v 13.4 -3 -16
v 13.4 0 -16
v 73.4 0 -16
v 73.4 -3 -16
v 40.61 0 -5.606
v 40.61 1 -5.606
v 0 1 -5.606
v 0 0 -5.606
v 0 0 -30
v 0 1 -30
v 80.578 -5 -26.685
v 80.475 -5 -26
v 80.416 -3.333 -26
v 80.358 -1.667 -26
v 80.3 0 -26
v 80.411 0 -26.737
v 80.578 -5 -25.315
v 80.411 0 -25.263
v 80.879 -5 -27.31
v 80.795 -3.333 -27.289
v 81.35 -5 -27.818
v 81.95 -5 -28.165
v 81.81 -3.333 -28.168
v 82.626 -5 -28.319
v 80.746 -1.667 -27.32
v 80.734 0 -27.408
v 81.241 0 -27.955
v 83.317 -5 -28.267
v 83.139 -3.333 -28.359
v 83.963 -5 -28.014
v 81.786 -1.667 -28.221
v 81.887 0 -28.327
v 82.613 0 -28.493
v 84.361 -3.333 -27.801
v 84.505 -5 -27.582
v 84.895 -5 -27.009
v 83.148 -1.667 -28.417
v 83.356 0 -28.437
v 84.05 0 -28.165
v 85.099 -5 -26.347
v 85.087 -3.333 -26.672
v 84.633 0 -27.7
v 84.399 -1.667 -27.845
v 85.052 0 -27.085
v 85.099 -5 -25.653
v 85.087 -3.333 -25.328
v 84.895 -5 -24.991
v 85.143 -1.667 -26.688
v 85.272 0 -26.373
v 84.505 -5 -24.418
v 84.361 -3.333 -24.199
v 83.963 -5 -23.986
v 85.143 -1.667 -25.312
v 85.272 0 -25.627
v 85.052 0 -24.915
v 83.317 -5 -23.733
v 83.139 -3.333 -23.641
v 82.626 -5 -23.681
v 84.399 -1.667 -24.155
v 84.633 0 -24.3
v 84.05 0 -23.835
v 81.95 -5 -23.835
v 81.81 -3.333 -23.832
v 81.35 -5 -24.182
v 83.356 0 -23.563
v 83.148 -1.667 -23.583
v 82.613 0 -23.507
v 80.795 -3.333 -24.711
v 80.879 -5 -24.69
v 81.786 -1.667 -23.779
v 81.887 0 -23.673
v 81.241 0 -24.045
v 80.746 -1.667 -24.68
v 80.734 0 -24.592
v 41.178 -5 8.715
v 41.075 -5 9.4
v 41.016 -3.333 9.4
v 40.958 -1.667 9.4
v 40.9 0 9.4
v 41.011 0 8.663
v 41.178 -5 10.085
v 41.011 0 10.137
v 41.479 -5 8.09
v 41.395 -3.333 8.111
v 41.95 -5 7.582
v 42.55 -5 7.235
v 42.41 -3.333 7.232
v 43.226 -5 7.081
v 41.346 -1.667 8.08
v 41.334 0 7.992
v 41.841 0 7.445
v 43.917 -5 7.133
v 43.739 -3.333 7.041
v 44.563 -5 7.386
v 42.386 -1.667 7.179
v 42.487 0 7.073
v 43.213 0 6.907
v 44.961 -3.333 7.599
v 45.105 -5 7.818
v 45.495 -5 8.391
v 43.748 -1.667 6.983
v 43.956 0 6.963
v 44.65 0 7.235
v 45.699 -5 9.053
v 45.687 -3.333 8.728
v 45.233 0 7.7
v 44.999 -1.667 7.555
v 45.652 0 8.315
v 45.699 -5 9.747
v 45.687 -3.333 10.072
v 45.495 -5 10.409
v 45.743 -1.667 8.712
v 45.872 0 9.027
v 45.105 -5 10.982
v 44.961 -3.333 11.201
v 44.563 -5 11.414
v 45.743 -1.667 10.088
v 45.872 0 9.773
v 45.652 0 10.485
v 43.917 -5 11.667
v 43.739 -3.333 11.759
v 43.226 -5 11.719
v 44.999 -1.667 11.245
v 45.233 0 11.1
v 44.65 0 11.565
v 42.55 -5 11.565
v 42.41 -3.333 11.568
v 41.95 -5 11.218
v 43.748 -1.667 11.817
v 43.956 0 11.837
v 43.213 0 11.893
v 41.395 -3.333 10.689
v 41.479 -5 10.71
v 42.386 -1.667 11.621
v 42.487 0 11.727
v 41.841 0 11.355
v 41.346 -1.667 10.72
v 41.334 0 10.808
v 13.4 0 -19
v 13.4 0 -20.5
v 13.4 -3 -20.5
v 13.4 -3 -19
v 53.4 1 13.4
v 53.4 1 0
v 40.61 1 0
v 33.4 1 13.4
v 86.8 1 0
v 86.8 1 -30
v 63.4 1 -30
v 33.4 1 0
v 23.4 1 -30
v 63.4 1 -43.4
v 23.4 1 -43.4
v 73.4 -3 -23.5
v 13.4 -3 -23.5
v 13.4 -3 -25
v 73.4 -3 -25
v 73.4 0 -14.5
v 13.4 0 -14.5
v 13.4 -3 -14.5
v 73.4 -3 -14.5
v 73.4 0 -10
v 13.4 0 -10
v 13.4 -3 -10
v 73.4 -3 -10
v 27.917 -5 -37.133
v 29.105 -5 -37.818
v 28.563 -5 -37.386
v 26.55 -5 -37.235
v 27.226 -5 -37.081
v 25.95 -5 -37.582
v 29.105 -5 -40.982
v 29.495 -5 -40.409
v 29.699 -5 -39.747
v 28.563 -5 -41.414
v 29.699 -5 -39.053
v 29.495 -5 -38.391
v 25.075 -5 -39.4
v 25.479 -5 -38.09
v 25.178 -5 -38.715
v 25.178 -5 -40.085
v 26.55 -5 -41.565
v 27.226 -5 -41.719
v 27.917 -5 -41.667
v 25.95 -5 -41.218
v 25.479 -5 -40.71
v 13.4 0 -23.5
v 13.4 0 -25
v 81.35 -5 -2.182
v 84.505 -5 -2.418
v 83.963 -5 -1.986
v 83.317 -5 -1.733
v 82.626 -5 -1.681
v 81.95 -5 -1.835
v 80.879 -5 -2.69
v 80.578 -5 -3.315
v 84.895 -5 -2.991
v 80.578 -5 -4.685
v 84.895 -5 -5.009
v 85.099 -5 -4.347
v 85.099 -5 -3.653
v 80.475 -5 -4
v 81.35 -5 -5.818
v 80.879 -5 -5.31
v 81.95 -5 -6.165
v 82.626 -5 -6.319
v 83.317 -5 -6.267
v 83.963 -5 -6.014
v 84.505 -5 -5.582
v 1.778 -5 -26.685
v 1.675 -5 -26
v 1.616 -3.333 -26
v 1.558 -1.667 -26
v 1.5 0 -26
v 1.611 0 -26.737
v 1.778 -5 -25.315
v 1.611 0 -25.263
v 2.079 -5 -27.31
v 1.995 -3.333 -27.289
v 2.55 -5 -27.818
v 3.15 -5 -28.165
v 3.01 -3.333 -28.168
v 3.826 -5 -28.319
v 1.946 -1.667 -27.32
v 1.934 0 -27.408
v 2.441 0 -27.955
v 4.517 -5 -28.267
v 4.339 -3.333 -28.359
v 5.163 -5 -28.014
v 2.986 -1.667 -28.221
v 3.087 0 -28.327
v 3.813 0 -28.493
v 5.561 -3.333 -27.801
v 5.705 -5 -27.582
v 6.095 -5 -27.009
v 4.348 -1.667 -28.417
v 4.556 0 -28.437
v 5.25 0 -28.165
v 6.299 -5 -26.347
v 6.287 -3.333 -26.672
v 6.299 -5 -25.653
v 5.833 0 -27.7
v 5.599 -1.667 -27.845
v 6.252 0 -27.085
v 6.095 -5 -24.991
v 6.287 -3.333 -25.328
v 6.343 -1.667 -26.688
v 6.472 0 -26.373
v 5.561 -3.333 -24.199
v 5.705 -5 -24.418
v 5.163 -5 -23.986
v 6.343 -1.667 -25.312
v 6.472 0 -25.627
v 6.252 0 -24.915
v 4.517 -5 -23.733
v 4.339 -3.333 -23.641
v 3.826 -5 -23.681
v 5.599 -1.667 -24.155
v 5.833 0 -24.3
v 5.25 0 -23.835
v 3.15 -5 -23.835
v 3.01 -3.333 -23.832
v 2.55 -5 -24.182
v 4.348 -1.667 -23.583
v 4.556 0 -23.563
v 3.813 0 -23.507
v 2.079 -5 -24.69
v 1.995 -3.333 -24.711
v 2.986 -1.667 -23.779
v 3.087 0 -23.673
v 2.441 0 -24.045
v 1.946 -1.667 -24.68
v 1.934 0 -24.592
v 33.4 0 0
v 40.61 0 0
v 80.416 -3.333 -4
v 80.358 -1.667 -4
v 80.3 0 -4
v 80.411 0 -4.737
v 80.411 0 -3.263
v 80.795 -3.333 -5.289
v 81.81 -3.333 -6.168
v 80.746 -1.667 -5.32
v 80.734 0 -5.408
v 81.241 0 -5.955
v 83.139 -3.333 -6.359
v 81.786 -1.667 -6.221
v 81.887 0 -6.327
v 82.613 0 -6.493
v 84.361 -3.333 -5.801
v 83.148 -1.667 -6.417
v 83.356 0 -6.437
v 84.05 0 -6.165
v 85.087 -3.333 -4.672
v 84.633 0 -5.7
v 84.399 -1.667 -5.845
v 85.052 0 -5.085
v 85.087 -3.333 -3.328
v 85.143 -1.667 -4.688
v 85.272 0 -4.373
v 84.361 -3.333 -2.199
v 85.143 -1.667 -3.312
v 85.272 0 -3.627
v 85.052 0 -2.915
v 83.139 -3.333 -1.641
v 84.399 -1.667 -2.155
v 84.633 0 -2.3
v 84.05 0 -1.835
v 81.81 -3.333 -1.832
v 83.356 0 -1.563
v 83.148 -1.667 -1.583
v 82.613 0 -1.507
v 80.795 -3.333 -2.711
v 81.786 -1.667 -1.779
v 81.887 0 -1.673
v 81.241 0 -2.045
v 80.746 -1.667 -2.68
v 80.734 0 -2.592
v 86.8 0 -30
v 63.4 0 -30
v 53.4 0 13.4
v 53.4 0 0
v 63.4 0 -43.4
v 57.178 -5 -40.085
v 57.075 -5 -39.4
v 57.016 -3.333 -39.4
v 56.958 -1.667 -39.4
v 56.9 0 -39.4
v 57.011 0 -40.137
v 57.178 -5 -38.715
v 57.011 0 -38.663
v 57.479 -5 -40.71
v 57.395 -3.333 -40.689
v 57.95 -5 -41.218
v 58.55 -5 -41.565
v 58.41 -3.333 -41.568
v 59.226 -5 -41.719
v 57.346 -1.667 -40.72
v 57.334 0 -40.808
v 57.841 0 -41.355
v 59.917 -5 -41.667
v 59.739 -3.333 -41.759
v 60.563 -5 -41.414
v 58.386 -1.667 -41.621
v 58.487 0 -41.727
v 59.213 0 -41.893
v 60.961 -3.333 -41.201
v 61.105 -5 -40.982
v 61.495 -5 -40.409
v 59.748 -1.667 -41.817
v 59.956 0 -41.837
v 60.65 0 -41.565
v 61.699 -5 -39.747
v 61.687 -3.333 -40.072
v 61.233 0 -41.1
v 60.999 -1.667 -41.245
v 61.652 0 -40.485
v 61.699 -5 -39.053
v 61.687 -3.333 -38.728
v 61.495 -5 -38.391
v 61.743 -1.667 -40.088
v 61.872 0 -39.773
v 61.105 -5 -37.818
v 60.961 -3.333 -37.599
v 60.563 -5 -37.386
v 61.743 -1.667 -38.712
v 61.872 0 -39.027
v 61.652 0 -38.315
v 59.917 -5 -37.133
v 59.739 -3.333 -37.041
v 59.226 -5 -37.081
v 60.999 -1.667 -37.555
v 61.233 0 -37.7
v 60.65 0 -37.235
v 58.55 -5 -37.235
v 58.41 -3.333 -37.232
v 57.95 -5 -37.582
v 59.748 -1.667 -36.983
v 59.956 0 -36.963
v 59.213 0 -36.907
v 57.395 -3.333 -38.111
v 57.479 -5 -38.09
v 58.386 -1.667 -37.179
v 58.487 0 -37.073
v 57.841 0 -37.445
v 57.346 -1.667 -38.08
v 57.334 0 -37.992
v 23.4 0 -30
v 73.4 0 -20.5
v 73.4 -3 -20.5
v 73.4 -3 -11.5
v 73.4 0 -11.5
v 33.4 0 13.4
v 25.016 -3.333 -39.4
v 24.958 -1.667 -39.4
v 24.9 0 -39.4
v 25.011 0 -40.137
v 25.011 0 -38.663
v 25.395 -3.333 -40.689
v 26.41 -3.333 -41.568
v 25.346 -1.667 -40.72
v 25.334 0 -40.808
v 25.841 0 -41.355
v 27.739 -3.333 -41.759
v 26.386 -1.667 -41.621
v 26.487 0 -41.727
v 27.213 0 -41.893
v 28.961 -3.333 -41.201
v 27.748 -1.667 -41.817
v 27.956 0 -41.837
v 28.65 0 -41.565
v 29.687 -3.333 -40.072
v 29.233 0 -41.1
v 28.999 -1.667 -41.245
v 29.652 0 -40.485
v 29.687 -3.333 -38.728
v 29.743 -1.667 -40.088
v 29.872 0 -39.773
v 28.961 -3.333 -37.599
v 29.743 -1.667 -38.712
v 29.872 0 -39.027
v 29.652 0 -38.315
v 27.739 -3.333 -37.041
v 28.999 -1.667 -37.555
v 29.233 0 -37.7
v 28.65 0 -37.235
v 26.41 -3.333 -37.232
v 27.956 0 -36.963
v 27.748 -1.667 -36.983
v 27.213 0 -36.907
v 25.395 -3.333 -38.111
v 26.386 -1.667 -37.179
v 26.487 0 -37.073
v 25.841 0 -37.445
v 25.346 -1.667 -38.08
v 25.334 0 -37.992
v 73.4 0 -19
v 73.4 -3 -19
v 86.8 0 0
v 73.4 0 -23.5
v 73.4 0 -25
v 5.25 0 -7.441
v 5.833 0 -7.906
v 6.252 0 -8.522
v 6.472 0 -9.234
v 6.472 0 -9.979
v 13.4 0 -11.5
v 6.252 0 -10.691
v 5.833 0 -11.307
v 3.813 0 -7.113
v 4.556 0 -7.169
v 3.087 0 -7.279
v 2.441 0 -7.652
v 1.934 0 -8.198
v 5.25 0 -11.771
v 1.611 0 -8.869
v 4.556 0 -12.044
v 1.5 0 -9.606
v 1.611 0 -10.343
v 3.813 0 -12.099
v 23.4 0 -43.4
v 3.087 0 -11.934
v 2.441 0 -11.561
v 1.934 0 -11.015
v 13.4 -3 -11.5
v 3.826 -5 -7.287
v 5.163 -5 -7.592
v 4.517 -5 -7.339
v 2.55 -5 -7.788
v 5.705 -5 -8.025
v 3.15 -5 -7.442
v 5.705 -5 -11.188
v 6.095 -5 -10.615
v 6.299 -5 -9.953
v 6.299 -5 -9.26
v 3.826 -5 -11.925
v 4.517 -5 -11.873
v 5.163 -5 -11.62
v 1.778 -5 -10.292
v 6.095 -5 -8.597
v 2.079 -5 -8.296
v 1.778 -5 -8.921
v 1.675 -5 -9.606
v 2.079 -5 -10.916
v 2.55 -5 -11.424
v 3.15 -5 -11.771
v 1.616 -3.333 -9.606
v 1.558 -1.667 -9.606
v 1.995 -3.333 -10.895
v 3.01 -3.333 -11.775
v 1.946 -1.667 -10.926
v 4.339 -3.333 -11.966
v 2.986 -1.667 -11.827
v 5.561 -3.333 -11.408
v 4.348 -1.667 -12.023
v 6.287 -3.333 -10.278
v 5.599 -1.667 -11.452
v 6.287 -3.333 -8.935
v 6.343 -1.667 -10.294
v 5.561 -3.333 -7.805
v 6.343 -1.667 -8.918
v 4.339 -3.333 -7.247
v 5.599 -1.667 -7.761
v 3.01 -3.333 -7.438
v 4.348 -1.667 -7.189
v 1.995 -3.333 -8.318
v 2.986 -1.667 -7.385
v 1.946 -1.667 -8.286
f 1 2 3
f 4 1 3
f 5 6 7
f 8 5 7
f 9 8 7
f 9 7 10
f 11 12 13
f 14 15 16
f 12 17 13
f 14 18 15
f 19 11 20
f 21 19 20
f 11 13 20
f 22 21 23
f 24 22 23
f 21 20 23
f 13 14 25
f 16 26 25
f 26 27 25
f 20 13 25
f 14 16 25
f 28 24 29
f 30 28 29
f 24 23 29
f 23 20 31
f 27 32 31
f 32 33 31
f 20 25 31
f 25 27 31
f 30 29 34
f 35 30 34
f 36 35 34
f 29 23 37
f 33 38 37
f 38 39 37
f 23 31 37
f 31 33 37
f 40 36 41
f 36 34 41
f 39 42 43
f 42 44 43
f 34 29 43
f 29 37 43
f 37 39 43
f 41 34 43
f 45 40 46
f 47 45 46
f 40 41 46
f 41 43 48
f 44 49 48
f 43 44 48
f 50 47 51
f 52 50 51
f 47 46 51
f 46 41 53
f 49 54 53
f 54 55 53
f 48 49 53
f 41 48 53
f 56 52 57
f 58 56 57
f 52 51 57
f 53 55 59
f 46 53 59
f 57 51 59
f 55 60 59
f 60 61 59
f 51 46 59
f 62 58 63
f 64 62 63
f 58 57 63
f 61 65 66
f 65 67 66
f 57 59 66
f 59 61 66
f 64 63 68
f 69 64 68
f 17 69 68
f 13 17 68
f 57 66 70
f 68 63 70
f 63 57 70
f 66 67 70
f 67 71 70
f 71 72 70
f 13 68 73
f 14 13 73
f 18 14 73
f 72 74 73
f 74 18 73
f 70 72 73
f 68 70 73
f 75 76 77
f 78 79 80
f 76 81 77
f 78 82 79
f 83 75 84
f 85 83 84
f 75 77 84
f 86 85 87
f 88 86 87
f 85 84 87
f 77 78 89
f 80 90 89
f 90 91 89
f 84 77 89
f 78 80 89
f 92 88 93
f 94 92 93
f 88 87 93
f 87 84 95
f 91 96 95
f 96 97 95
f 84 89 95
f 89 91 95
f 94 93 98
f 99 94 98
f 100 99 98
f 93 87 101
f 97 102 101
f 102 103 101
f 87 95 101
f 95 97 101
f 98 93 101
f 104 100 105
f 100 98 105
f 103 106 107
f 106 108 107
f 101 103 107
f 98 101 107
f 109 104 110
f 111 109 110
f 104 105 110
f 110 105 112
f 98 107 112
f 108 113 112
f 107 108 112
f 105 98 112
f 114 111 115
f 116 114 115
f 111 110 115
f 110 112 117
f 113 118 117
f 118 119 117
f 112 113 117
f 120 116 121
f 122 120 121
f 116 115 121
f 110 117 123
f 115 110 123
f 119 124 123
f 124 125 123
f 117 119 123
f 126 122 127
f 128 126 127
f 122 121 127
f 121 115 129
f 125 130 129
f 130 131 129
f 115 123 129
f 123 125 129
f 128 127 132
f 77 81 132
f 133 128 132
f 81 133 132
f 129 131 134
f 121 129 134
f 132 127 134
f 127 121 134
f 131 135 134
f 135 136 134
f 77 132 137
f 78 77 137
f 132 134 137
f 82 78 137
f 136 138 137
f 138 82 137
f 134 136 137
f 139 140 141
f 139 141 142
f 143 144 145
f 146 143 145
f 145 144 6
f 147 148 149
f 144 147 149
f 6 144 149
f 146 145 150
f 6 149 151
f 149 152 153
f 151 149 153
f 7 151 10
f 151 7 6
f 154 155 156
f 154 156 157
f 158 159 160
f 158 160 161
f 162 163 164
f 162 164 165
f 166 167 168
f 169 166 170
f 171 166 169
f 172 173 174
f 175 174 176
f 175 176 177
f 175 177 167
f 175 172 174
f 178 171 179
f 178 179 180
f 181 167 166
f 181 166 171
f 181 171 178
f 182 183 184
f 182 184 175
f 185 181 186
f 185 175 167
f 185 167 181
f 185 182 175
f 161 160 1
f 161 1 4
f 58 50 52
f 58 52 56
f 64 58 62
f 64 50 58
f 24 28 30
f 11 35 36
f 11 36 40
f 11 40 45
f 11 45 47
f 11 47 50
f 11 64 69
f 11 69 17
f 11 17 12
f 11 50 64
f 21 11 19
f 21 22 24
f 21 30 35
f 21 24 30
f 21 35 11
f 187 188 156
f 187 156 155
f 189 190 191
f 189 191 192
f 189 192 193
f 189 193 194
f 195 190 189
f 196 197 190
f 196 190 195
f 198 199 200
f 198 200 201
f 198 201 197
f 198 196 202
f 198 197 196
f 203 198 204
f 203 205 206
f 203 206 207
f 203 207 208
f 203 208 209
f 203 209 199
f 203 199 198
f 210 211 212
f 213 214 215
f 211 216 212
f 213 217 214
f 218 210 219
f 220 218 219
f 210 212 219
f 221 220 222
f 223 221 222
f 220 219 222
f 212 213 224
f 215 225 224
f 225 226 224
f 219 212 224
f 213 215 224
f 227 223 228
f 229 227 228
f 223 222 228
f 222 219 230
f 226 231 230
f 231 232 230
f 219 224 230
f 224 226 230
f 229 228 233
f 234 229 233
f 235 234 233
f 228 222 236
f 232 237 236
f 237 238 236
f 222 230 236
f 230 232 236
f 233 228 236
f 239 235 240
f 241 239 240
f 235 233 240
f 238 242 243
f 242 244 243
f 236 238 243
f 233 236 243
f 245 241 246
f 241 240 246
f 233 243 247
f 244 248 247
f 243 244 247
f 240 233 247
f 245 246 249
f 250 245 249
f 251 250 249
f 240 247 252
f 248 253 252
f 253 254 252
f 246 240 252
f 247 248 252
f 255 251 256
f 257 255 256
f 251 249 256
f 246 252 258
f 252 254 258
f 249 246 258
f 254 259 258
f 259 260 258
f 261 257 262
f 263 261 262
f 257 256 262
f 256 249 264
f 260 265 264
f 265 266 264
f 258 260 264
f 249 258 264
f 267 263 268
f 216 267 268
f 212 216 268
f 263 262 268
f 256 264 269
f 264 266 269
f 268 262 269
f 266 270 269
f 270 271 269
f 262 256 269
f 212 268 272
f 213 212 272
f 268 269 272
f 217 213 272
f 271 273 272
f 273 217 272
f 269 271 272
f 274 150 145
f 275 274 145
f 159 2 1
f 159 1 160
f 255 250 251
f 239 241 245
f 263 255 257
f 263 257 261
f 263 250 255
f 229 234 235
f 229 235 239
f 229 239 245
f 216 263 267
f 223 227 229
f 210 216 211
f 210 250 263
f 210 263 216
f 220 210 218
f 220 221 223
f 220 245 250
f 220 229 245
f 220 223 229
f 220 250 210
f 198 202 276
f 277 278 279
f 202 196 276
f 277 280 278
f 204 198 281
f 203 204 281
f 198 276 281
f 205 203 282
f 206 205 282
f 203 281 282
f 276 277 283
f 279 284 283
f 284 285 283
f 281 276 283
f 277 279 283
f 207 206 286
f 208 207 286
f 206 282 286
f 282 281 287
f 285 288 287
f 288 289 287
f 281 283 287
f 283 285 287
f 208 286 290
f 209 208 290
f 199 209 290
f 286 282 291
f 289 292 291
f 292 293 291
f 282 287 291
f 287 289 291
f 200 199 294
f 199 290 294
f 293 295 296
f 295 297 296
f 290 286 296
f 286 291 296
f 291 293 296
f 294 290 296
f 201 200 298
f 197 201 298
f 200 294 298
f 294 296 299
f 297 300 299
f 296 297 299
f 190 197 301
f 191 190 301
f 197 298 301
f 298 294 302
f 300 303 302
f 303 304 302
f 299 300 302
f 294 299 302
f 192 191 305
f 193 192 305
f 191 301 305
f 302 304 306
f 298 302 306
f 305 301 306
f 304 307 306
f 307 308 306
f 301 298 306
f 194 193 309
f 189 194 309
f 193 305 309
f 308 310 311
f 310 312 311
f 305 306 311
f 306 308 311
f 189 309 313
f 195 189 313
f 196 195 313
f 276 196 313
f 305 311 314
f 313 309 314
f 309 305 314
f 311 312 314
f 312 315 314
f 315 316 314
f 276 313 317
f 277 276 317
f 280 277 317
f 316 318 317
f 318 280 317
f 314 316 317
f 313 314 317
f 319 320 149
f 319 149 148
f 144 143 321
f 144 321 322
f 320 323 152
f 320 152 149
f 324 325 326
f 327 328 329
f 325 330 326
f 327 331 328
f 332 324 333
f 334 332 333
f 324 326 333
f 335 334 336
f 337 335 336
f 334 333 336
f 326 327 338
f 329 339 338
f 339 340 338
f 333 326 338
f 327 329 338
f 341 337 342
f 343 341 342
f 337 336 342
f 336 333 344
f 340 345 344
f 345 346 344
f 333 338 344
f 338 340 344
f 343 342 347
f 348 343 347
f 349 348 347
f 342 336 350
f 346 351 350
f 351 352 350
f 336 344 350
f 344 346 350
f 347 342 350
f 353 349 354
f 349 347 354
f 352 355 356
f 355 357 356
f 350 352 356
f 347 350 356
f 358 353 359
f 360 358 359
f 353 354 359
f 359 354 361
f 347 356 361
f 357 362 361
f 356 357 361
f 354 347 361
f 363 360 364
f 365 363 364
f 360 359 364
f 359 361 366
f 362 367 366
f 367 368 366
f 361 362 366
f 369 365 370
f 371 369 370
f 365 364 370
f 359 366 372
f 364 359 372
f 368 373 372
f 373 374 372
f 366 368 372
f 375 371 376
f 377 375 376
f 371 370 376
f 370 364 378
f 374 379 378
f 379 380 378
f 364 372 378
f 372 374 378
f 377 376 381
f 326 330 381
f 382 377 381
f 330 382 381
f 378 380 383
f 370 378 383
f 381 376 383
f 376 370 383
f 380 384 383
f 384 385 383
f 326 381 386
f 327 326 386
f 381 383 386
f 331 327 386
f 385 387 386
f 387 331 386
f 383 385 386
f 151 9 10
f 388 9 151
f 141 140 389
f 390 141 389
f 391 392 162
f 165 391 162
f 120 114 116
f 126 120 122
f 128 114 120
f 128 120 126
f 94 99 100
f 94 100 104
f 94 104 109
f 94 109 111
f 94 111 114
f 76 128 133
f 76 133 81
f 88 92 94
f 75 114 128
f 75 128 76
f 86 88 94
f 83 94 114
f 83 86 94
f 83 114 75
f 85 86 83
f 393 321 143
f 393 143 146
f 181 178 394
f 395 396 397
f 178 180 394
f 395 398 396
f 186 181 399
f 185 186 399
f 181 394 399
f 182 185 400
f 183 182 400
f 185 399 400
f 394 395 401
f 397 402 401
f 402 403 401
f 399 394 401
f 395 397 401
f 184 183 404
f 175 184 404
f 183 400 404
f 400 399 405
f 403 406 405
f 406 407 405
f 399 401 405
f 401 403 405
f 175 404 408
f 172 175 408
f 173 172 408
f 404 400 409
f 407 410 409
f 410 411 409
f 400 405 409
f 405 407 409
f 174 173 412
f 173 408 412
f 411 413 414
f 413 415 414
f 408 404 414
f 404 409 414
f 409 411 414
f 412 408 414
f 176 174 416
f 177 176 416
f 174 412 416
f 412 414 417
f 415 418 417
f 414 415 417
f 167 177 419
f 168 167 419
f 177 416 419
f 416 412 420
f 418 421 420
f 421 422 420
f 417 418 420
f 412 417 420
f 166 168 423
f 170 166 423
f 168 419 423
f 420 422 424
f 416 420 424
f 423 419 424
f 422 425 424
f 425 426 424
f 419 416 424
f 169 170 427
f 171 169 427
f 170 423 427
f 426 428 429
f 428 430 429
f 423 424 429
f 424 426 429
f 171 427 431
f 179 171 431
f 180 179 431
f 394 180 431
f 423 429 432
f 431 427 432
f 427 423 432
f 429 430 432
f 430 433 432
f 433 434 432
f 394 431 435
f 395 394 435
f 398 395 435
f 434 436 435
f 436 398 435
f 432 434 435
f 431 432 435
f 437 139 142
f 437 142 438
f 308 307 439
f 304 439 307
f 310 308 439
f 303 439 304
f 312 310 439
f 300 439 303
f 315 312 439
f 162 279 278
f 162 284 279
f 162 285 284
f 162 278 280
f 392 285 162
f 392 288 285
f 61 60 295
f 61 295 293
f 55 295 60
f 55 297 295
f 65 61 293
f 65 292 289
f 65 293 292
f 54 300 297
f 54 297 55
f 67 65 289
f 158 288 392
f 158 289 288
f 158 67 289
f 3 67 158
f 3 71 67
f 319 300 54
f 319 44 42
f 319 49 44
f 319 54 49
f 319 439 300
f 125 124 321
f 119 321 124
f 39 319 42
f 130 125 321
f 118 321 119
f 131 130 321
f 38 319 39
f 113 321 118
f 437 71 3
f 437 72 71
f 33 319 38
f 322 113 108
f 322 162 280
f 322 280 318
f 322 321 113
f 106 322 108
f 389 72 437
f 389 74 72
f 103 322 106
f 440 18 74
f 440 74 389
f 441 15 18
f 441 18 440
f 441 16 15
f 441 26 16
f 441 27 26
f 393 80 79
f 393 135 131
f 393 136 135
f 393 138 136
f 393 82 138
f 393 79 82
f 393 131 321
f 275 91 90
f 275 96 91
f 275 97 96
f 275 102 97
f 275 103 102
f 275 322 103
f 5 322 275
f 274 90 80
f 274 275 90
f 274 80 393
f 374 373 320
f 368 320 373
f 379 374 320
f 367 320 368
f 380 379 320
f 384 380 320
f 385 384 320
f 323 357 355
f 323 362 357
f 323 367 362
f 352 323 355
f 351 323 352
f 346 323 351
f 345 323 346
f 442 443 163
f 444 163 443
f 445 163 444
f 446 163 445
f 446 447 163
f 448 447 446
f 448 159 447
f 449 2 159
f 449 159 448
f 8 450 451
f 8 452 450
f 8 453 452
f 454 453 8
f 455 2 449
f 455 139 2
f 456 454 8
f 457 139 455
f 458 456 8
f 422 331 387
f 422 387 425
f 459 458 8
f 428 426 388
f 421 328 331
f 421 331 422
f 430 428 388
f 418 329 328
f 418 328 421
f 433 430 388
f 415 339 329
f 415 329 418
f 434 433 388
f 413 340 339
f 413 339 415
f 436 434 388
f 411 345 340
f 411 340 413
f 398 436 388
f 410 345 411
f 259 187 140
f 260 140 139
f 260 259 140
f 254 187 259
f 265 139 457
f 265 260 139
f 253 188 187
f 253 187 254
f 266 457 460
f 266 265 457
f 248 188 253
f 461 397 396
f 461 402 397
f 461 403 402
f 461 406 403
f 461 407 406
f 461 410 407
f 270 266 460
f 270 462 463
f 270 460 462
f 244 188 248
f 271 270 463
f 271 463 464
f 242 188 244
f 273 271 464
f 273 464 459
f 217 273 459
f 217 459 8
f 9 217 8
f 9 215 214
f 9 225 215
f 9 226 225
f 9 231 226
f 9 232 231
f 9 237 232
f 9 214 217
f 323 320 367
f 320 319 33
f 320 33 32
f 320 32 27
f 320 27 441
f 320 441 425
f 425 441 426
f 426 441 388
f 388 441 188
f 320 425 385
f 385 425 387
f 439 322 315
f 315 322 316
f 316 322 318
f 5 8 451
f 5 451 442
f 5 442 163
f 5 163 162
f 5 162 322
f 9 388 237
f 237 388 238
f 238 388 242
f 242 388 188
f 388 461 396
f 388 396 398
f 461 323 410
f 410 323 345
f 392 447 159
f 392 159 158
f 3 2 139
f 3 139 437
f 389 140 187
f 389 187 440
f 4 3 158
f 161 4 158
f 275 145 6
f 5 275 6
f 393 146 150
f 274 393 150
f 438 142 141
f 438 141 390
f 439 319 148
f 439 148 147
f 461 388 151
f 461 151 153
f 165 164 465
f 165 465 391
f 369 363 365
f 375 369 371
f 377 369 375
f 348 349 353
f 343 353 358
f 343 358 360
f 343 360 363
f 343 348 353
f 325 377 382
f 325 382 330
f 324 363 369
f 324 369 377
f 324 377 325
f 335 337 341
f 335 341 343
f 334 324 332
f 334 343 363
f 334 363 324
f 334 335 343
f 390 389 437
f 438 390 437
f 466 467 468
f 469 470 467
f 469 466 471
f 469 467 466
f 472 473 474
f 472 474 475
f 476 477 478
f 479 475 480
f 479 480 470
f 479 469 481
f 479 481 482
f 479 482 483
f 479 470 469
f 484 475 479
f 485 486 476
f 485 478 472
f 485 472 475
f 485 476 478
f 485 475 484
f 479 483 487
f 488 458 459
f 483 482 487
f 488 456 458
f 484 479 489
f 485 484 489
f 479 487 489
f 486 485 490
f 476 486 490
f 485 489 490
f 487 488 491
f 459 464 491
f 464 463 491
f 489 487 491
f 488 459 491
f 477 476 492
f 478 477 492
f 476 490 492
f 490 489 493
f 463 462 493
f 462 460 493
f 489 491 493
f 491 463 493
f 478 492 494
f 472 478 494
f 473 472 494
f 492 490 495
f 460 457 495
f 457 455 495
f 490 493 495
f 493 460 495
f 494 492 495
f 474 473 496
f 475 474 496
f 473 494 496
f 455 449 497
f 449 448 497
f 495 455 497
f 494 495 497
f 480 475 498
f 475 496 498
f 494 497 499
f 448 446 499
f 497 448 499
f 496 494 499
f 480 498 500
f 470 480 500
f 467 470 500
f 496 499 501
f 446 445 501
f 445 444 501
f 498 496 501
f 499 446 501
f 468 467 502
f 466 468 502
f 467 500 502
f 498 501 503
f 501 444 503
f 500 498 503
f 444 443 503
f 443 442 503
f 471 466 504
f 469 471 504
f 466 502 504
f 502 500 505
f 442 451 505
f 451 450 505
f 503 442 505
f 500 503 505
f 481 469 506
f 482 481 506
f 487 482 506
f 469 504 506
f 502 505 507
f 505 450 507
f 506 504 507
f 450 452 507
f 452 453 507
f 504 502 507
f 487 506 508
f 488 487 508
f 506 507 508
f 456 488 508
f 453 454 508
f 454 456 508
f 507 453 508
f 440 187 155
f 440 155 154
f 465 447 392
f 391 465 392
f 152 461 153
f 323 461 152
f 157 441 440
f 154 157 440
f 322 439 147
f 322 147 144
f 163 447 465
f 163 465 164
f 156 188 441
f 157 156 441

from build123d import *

# Parameters (mm, degrees)
BOSS_EXTRUDE1_DEPTH           = 1
SKETCH3_W                     = 10
SKETCH3_H                     = 13.4
CUT_EXTRUDE1_DEPTH            = 98.050502317
SKETCH4_W                     = 60
SKETCH4_H                     = 1.5
BOSS_EXTRUDE3_DEPTH           = 3
SKETCH5_R                     = 2.5
BOSS_EXTRUDE4_DEPTH           = 5
BOSS_EXTRUDE4_DRAFT           = 2
BOSS_EXTRUDE4_PROFILE_2_DEPTH = 5
BOSS_EXTRUDE4_PROFILE_2_DRAFT = 2
BOSS_EXTRUDE4_PROFILE_3_DEPTH = 5
BOSS_EXTRUDE4_PROFILE_3_DRAFT = 2
BOSS_EXTRUDE4_PROFILE_4_DEPTH = 5
BOSS_EXTRUDE4_PROFILE_4_DRAFT = 2
BOSS_EXTRUDE4_PROFILE_5_DEPTH = 5
BOSS_EXTRUDE4_PROFILE_5_DRAFT = 2
BOSS_EXTRUDE4_PROFILE_6_DEPTH = 5
BOSS_EXTRUDE4_PROFILE_6_DRAFT = 2
BOSS_EXTRUDE4_PROFILE_7_DEPTH = 5
BOSS_EXTRUDE4_PROFILE_7_DRAFT = 2


with BuildPart() as part:
    # Sketch1 → Boss-Extrude1 (new body)
    with BuildSketch(Plane(origin=(0, 0, 0), x_dir=(1, 0, 0), z_dir=(0, 1, 0))):
        Polygon((63.4, 30), (86.8, 30), (86.8, 0), (63.4, 0), (63.4, -13.4), (23.4, -13.4), (23.4, 0), (0, 0), (0, 30), (23.4, 30), (23.4, 43.4), (63.4, 43.4), align=None)
    extrude(amount=BOSS_EXTRUDE1_DEPTH)

    # Sketch3 → Cut-Extrude1 (cut, through all)
    with BuildSketch(Plane(origin=(0, 1, 0), x_dir=(1, 0, 0), z_dir=(0, 1, 0))):
        Polygon((0, 0), (23.4, 0), (33.4, 0), (40.609890906, 0), (40.609890906, 5.606324955), (0, 5.606324955), align=None)
        with Locations((28.4, -6.7)):
            Rectangle(SKETCH3_W, SKETCH3_H)
        with Locations((58.4, -6.7)):
            Rectangle(SKETCH3_W, SKETCH3_H)
    extrude(amount=-CUT_EXTRUDE1_DEPTH, mode=Mode.SUBTRACT)

    # Sketch4 → Boss-Extrude3 (add)
    with BuildSketch(Plane.XZ):
        with Locations((43.4, -15.25)):
            Rectangle(SKETCH4_W, SKETCH4_H)
        with Locations((43.4, -10.75)):
            Rectangle(SKETCH4_W, SKETCH4_H)
        with Locations((43.4, -19.75)):
            Rectangle(SKETCH4_W, SKETCH4_H)
        with Locations((43.4, -24.25)):
            Rectangle(SKETCH4_W, SKETCH4_H)
    extrude(amount=BOSS_EXTRUDE3_DEPTH)


with BuildPart() as boss_extrude4_tool:
    # Sketch5 → Boss-Extrude4 (with draft: the straight prism first)
    with BuildSketch(Plane(origin=(0, 0, 0), x_dir=(-1, 0, 0), z_dir=(0, -1, 0))):
        with Locations((-4, 9.606324955)):
            Circle(SKETCH5_R)
    extrude(amount=BOSS_EXTRUDE4_DEPTH)
    # Boss-Extrude4: the draft: its side faces are tilted about the plane it starts from
    boss_extrude4_sides = [boss_extrude4_tool.faces().sort_by_distance(p)[0] for p in [
        (6.5, -2.5, -9.606324955),
    ]]
    draft(boss_extrude4_sides, Plane(origin=(0, 0, 0), x_dir=(-1, 0, 0), z_dir=(0, -1, 0)), BOSS_EXTRUDE4_DRAFT)


with BuildPart() as part_1:
    add(part.part)

    # Boss-Extrude4: add boss_extrude4_tool
    add(boss_extrude4_tool.part)


with BuildPart() as boss_extrude4_profile_2_tool:
    # Sketch5 → Boss-Extrude4 profile 2 (with draft: the straight prism first)
    with BuildSketch(Plane(origin=(0, 0, 0), x_dir=(-1, 0, 0), z_dir=(0, -1, 0))):
        with Locations((-4, 26)):
            Circle(SKETCH5_R)
    extrude(amount=BOSS_EXTRUDE4_PROFILE_2_DEPTH)
    # Boss-Extrude4 profile 2: the draft: its side faces are tilted about the plane it starts from
    boss_extrude4_profile_2_sides = [boss_extrude4_profile_2_tool.faces().sort_by_distance(p)[0] for p in [
        (6.5, -2.5, -26),
    ]]
    draft(boss_extrude4_profile_2_sides, Plane(origin=(0, 0, 0), x_dir=(-1, 0, 0), z_dir=(0, -1, 0)), BOSS_EXTRUDE4_PROFILE_2_DRAFT)


with BuildPart() as part_2:
    add(part_1.part)

    # Boss-Extrude4 profile 2: add boss_extrude4_profile_2_tool
    add(boss_extrude4_profile_2_tool.part)


with BuildPart() as boss_extrude4_profile_3_tool:
    # Sketch5 → Boss-Extrude4 profile 3 (with draft: the straight prism first)
    with BuildSketch(Plane(origin=(0, 0, 0), x_dir=(-1, 0, 0), z_dir=(0, -1, 0))):
        with Locations((-82.8, 26)):
            Circle(SKETCH5_R)
    extrude(amount=BOSS_EXTRUDE4_PROFILE_3_DEPTH)
    # Boss-Extrude4 profile 3: the draft: its side faces are tilted about the plane it starts from
    boss_extrude4_profile_3_sides = [boss_extrude4_profile_3_tool.faces().sort_by_distance(p)[0] for p in [
        (85.3, -2.5, -26),
    ]]
    draft(boss_extrude4_profile_3_sides, Plane(origin=(0, 0, 0), x_dir=(-1, 0, 0), z_dir=(0, -1, 0)), BOSS_EXTRUDE4_PROFILE_3_DRAFT)


with BuildPart() as part_3:
    add(part_2.part)

    # Boss-Extrude4 profile 3: add boss_extrude4_profile_3_tool
    add(boss_extrude4_profile_3_tool.part)


with BuildPart() as boss_extrude4_profile_4_tool:
    # Sketch5 → Boss-Extrude4 profile 4 (with draft: the straight prism first)
    with BuildSketch(Plane(origin=(0, 0, 0), x_dir=(-1, 0, 0), z_dir=(0, -1, 0))):
        with Locations((-82.8, 4)):
            Circle(SKETCH5_R)
    extrude(amount=BOSS_EXTRUDE4_PROFILE_4_DEPTH)
    # Boss-Extrude4 profile 4: the draft: its side faces are tilted about the plane it starts from
    boss_extrude4_profile_4_sides = [boss_extrude4_profile_4_tool.faces().sort_by_distance(p)[0] for p in [
        (85.3, -2.5, -4),
    ]]
    draft(boss_extrude4_profile_4_sides, Plane(origin=(0, 0, 0), x_dir=(-1, 0, 0), z_dir=(0, -1, 0)), BOSS_EXTRUDE4_PROFILE_4_DRAFT)


with BuildPart() as part_4:
    add(part_3.part)

    # Boss-Extrude4 profile 4: add boss_extrude4_profile_4_tool
    add(boss_extrude4_profile_4_tool.part)


with BuildPart() as boss_extrude4_profile_5_tool:
    # Sketch5 → Boss-Extrude4 profile 5 (with draft: the straight prism first)
    with BuildSketch(Plane(origin=(0, 0, 0), x_dir=(-1, 0, 0), z_dir=(0, -1, 0))):
        with Locations((-59.4, 39.4)):
            Circle(SKETCH5_R)
    extrude(amount=BOSS_EXTRUDE4_PROFILE_5_DEPTH)
    # Boss-Extrude4 profile 5: the draft: its side faces are tilted about the plane it starts from
    boss_extrude4_profile_5_sides = [boss_extrude4_profile_5_tool.faces().sort_by_distance(p)[0] for p in [
        (61.9, -2.5, -39.4),
    ]]
    draft(boss_extrude4_profile_5_sides, Plane(origin=(0, 0, 0), x_dir=(-1, 0, 0), z_dir=(0, -1, 0)), BOSS_EXTRUDE4_PROFILE_5_DRAFT)


with BuildPart() as part_5:
    add(part_4.part)

    # Boss-Extrude4 profile 5: add boss_extrude4_profile_5_tool
    add(boss_extrude4_profile_5_tool.part)


with BuildPart() as boss_extrude4_profile_6_tool:
    # Sketch5 → Boss-Extrude4 profile 6 (with draft: the straight prism first)
    with BuildSketch(Plane(origin=(0, 0, 0), x_dir=(-1, 0, 0), z_dir=(0, -1, 0))):
        with Locations((-27.4, 39.4)):
            Circle(SKETCH5_R)
    extrude(amount=BOSS_EXTRUDE4_PROFILE_6_DEPTH)
    # Boss-Extrude4 profile 6: the draft: its side faces are tilted about the plane it starts from
    boss_extrude4_profile_6_sides = [boss_extrude4_profile_6_tool.faces().sort_by_distance(p)[0] for p in [
        (29.9, -2.5, -39.4),
    ]]
    draft(boss_extrude4_profile_6_sides, Plane(origin=(0, 0, 0), x_dir=(-1, 0, 0), z_dir=(0, -1, 0)), BOSS_EXTRUDE4_PROFILE_6_DRAFT)


with BuildPart() as part_6:
    add(part_5.part)

    # Boss-Extrude4 profile 6: add boss_extrude4_profile_6_tool
    add(boss_extrude4_profile_6_tool.part)


with BuildPart() as boss_extrude4_profile_7_tool:
    # Sketch5 → Boss-Extrude4 profile 7 (with draft: the straight prism first)
    with BuildSketch(Plane(origin=(0, 0, 0), x_dir=(-1, 0, 0), z_dir=(0, -1, 0))):
        with Locations((-43.4, -9.4)):
            Circle(SKETCH5_R)
    extrude(amount=BOSS_EXTRUDE4_PROFILE_7_DEPTH)
    # Boss-Extrude4 profile 7: the draft: its side faces are tilted about the plane it starts from
    boss_extrude4_profile_7_sides = [boss_extrude4_profile_7_tool.faces().sort_by_distance(p)[0] for p in [
        (45.9, -2.5, 9.4),
    ]]
    draft(boss_extrude4_profile_7_sides, Plane(origin=(0, 0, 0), x_dir=(-1, 0, 0), z_dir=(0, -1, 0)), BOSS_EXTRUDE4_PROFILE_7_DRAFT)


with BuildPart() as part_7:
    add(part_6.part)

    # Boss-Extrude4 profile 7: add boss_extrude4_profile_7_tool
    add(boss_extrude4_profile_7_tool.part)


solid = part_7.part
